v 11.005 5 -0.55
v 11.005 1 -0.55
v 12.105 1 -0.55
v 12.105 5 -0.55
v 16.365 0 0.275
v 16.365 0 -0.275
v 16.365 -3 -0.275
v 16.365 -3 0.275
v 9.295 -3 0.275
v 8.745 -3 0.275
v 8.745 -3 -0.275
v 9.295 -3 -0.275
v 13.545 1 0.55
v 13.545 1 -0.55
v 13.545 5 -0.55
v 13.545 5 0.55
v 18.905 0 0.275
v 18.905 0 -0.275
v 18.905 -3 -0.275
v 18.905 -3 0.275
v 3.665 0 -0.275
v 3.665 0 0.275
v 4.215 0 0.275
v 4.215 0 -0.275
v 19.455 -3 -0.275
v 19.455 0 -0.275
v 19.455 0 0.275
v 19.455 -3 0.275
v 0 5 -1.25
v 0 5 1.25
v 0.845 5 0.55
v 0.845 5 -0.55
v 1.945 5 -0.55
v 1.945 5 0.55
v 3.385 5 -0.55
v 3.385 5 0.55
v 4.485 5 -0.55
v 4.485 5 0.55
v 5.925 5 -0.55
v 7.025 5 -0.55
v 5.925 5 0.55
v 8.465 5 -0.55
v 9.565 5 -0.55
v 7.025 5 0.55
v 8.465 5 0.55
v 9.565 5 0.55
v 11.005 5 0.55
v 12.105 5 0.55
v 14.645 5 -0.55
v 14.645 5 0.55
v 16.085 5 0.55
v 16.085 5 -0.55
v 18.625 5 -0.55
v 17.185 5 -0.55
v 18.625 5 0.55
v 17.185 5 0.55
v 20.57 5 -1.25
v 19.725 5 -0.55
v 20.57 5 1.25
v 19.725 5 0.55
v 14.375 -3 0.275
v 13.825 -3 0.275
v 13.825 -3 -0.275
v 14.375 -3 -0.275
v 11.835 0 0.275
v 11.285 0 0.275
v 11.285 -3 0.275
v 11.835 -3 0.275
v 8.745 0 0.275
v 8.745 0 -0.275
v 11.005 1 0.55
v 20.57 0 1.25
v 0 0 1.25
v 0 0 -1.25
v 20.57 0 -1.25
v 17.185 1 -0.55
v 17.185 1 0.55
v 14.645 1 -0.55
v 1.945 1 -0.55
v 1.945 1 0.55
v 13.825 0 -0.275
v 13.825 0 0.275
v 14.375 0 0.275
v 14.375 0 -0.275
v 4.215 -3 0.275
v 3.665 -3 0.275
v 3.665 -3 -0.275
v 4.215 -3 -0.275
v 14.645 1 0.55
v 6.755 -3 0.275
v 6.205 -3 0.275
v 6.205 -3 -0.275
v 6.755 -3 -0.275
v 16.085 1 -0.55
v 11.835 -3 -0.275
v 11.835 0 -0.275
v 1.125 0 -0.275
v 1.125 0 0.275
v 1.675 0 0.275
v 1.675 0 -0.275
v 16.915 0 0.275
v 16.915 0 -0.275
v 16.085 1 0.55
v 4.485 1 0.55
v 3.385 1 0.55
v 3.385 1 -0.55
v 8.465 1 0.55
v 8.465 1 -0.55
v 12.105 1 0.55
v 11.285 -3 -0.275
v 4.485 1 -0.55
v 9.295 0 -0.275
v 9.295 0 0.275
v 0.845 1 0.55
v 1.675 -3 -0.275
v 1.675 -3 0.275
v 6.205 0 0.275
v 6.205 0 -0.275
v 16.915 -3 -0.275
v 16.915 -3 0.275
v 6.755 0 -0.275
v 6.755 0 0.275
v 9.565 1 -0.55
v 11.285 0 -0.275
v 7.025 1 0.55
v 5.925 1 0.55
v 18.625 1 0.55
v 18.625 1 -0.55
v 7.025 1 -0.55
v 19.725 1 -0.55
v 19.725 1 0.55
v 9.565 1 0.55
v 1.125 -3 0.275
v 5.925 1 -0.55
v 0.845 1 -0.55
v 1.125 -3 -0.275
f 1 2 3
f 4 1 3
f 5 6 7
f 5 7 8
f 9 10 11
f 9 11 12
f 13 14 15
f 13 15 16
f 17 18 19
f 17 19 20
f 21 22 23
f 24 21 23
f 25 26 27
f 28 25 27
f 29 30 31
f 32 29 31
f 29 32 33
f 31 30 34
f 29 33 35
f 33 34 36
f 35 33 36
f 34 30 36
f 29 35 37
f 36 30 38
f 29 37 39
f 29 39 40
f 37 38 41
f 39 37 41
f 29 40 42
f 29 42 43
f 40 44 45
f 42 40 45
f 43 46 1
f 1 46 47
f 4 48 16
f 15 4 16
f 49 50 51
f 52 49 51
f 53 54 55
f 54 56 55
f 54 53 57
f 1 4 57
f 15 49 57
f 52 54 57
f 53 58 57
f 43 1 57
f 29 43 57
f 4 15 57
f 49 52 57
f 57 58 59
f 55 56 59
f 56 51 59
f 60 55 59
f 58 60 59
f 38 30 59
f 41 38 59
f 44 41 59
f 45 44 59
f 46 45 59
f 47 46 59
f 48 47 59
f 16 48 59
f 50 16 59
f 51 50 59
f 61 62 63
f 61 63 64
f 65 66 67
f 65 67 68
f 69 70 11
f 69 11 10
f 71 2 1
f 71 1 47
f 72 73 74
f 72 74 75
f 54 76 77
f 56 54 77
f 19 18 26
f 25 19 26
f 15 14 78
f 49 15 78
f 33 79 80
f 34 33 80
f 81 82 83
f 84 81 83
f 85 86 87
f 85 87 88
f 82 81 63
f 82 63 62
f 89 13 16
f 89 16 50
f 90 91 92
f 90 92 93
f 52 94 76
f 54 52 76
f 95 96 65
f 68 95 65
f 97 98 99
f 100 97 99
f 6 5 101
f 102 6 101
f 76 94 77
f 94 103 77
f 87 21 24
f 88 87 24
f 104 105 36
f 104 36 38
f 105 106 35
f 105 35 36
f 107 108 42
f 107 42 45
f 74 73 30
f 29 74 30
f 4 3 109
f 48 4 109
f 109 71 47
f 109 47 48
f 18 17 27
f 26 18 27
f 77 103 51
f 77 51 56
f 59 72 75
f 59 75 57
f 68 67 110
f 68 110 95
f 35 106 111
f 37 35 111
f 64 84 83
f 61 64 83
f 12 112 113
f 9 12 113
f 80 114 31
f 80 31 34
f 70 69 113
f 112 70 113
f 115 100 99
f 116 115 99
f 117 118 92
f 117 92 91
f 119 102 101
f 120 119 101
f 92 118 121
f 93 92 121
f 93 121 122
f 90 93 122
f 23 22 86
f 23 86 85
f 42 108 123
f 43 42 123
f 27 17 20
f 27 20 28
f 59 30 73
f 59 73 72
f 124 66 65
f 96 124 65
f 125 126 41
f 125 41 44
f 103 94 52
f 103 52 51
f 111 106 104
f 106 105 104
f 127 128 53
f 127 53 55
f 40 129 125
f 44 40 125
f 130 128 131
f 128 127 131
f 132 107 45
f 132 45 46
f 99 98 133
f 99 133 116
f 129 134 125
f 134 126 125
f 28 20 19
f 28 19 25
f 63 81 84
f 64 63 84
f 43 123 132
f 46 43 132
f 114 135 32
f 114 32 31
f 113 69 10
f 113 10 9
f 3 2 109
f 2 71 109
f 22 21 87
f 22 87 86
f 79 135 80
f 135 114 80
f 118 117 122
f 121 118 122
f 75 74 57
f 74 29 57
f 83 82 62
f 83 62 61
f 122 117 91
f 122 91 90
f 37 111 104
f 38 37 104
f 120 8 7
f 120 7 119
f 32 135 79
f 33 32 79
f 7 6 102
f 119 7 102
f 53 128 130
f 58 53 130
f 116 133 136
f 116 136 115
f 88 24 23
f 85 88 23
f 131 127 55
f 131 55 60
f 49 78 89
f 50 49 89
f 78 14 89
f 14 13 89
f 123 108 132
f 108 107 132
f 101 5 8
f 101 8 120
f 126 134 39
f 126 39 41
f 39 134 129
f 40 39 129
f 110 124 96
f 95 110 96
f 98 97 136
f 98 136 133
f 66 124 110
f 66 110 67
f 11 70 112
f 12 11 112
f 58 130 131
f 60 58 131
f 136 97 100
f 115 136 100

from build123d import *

# Parameters (mm, degrees)
SKETCH1_W             = 20.57
SKETCH1_H             = 5
BOSS_EXTRUDE1_DEPTH   = 1.25
SKETCH2_W             = 1.1
SKETCH2_H             = 1.1
CUT_EXTRUDE1_DEPTH    = 6
SKETCH3_W             = 20.57
SKETCH3_H             = 2.5
BOSS_EXTRUDE2_DEPTH   = 1
SKETCH4_W             = 0.55
SKETCH4_H             = 0.55
BOSS_EXTRUDE3_DEPTH   = 3
BOSS_EXTRUDE3_2_DEPTH = 3
BOSS_EXTRUDE3_3_DEPTH = 3
BOSS_EXTRUDE3_4_DEPTH = 3
BOSS_EXTRUDE3_5_DEPTH = 3
BOSS_EXTRUDE3_6_DEPTH = 3
BOSS_EXTRUDE3_7_DEPTH = 3
BOSS_EXTRUDE3_8_DEPTH = 3


with BuildPart() as part:
    # Sketch1 → Boss-Extrude1 (new body, symmetric)
    with BuildSketch(Plane.XY):
        with Locations((10.285, 2.5)):
            Rectangle(SKETCH1_W, SKETCH1_H)
    extrude(amount=BOSS_EXTRUDE1_DEPTH, both=True)

    # Sketch2 → Cut-Extrude1 (cut, through all)
    with BuildSketch(Plane.XZ):
        with Locations((3.935, 0)):
            Rectangle(SKETCH2_W, SKETCH2_H)
        with Locations((1.395, 0)):
            Rectangle(SKETCH2_W, SKETCH2_H)
        with Locations((6.475, 0)):
            Rectangle(SKETCH2_W, SKETCH2_H)
        with Locations((9.015, 0)):
            Rectangle(SKETCH2_W, SKETCH2_H)
        with Locations((11.555, 0)):
            Rectangle(SKETCH2_W, SKETCH2_H)
        with Locations((14.095, 0)):
            Rectangle(SKETCH2_W, SKETCH2_H)
        with Locations((16.635, 0)):
            Rectangle(SKETCH2_W, SKETCH2_H)
        with Locations((19.175, 0)):
            Rectangle(SKETCH2_W, SKETCH2_H)
    extrude(amount=-CUT_EXTRUDE1_DEPTH, mode=Mode.SUBTRACT)

    # Sketch3 → Boss-Extrude2 (add)
    with BuildSketch(Plane.XZ):
        with Locations((10.285, 0)):
            Rectangle(SKETCH3_W, SKETCH3_H)
    extrude(amount=-BOSS_EXTRUDE2_DEPTH)


with BuildPart() as body_2:
    # Sketch4 → Boss-Extrude3 (new body)
    with BuildSketch(Plane.XZ):
        with Locations((1.4, 0)):
            Rectangle(SKETCH4_W, SKETCH4_H)
    extrude(amount=BOSS_EXTRUDE3_DEPTH)


with BuildPart() as body_3:
    # Sketch4 → Boss-Extrude3 2 (new body)
    with BuildSketch(Plane.XZ):
        with Locations((3.94, 0)):
            Rectangle(SKETCH4_W, SKETCH4_H)
    extrude(amount=BOSS_EXTRUDE3_2_DEPTH)


with BuildPart() as body_4:
    # Sketch4 → Boss-Extrude3 3 (new body)
    with BuildSketch(Plane.XZ):
        with Locations((6.48, 0)):
            Rectangle(SKETCH4_W, SKETCH4_H)
    extrude(amount=BOSS_EXTRUDE3_3_DEPTH)


with BuildPart() as body_5:
    # Sketch4 → Boss-Extrude3 4 (new body)
    with BuildSketch(Plane.XZ):
        with Locations((9.02, 0)):
            Rectangle(SKETCH4_W, SKETCH4_H)
    extrude(amount=BOSS_EXTRUDE3_4_DEPTH)


with BuildPart() as body_6:
    # Sketch4 → Boss-Extrude3 5 (new body)
    with BuildSketch(Plane.XZ):
        with Locations((11.56, 0)):
            Rectangle(SKETCH4_W, SKETCH4_H)
    extrude(amount=BOSS_EXTRUDE3_5_DEPTH)


with BuildPart() as body_7:
    # Sketch4 → Boss-Extrude3 6 (new body)
    with BuildSketch(Plane.XZ):
        with Locations((14.1, 0)):
            Rectangle(SKETCH4_W, SKETCH4_H)
    extrude(amount=BOSS_EXTRUDE3_6_DEPTH)


with BuildPart() as body_8:
    # Sketch4 → Boss-Extrude3 7 (new body)
    with BuildSketch(Plane.XZ):
        with Locations((16.64, 0)):
            Rectangle(SKETCH4_W, SKETCH4_H)
    extrude(amount=BOSS_EXTRUDE3_7_DEPTH)


with BuildPart() as body_9:
    # Sketch4 → Boss-Extrude3 8 (new body)
    with BuildSketch(Plane.XZ):
        with Locations((19.18, 0)):
            Rectangle(SKETCH4_W, SKETCH4_H)
    extrude(amount=BOSS_EXTRUDE3_8_DEPTH)


solid = Compound([part.part, body_2.part, body_3.part, body_4.part, body_5.part, body_6.part, body_7.part, body_8.part, body_9.part])
